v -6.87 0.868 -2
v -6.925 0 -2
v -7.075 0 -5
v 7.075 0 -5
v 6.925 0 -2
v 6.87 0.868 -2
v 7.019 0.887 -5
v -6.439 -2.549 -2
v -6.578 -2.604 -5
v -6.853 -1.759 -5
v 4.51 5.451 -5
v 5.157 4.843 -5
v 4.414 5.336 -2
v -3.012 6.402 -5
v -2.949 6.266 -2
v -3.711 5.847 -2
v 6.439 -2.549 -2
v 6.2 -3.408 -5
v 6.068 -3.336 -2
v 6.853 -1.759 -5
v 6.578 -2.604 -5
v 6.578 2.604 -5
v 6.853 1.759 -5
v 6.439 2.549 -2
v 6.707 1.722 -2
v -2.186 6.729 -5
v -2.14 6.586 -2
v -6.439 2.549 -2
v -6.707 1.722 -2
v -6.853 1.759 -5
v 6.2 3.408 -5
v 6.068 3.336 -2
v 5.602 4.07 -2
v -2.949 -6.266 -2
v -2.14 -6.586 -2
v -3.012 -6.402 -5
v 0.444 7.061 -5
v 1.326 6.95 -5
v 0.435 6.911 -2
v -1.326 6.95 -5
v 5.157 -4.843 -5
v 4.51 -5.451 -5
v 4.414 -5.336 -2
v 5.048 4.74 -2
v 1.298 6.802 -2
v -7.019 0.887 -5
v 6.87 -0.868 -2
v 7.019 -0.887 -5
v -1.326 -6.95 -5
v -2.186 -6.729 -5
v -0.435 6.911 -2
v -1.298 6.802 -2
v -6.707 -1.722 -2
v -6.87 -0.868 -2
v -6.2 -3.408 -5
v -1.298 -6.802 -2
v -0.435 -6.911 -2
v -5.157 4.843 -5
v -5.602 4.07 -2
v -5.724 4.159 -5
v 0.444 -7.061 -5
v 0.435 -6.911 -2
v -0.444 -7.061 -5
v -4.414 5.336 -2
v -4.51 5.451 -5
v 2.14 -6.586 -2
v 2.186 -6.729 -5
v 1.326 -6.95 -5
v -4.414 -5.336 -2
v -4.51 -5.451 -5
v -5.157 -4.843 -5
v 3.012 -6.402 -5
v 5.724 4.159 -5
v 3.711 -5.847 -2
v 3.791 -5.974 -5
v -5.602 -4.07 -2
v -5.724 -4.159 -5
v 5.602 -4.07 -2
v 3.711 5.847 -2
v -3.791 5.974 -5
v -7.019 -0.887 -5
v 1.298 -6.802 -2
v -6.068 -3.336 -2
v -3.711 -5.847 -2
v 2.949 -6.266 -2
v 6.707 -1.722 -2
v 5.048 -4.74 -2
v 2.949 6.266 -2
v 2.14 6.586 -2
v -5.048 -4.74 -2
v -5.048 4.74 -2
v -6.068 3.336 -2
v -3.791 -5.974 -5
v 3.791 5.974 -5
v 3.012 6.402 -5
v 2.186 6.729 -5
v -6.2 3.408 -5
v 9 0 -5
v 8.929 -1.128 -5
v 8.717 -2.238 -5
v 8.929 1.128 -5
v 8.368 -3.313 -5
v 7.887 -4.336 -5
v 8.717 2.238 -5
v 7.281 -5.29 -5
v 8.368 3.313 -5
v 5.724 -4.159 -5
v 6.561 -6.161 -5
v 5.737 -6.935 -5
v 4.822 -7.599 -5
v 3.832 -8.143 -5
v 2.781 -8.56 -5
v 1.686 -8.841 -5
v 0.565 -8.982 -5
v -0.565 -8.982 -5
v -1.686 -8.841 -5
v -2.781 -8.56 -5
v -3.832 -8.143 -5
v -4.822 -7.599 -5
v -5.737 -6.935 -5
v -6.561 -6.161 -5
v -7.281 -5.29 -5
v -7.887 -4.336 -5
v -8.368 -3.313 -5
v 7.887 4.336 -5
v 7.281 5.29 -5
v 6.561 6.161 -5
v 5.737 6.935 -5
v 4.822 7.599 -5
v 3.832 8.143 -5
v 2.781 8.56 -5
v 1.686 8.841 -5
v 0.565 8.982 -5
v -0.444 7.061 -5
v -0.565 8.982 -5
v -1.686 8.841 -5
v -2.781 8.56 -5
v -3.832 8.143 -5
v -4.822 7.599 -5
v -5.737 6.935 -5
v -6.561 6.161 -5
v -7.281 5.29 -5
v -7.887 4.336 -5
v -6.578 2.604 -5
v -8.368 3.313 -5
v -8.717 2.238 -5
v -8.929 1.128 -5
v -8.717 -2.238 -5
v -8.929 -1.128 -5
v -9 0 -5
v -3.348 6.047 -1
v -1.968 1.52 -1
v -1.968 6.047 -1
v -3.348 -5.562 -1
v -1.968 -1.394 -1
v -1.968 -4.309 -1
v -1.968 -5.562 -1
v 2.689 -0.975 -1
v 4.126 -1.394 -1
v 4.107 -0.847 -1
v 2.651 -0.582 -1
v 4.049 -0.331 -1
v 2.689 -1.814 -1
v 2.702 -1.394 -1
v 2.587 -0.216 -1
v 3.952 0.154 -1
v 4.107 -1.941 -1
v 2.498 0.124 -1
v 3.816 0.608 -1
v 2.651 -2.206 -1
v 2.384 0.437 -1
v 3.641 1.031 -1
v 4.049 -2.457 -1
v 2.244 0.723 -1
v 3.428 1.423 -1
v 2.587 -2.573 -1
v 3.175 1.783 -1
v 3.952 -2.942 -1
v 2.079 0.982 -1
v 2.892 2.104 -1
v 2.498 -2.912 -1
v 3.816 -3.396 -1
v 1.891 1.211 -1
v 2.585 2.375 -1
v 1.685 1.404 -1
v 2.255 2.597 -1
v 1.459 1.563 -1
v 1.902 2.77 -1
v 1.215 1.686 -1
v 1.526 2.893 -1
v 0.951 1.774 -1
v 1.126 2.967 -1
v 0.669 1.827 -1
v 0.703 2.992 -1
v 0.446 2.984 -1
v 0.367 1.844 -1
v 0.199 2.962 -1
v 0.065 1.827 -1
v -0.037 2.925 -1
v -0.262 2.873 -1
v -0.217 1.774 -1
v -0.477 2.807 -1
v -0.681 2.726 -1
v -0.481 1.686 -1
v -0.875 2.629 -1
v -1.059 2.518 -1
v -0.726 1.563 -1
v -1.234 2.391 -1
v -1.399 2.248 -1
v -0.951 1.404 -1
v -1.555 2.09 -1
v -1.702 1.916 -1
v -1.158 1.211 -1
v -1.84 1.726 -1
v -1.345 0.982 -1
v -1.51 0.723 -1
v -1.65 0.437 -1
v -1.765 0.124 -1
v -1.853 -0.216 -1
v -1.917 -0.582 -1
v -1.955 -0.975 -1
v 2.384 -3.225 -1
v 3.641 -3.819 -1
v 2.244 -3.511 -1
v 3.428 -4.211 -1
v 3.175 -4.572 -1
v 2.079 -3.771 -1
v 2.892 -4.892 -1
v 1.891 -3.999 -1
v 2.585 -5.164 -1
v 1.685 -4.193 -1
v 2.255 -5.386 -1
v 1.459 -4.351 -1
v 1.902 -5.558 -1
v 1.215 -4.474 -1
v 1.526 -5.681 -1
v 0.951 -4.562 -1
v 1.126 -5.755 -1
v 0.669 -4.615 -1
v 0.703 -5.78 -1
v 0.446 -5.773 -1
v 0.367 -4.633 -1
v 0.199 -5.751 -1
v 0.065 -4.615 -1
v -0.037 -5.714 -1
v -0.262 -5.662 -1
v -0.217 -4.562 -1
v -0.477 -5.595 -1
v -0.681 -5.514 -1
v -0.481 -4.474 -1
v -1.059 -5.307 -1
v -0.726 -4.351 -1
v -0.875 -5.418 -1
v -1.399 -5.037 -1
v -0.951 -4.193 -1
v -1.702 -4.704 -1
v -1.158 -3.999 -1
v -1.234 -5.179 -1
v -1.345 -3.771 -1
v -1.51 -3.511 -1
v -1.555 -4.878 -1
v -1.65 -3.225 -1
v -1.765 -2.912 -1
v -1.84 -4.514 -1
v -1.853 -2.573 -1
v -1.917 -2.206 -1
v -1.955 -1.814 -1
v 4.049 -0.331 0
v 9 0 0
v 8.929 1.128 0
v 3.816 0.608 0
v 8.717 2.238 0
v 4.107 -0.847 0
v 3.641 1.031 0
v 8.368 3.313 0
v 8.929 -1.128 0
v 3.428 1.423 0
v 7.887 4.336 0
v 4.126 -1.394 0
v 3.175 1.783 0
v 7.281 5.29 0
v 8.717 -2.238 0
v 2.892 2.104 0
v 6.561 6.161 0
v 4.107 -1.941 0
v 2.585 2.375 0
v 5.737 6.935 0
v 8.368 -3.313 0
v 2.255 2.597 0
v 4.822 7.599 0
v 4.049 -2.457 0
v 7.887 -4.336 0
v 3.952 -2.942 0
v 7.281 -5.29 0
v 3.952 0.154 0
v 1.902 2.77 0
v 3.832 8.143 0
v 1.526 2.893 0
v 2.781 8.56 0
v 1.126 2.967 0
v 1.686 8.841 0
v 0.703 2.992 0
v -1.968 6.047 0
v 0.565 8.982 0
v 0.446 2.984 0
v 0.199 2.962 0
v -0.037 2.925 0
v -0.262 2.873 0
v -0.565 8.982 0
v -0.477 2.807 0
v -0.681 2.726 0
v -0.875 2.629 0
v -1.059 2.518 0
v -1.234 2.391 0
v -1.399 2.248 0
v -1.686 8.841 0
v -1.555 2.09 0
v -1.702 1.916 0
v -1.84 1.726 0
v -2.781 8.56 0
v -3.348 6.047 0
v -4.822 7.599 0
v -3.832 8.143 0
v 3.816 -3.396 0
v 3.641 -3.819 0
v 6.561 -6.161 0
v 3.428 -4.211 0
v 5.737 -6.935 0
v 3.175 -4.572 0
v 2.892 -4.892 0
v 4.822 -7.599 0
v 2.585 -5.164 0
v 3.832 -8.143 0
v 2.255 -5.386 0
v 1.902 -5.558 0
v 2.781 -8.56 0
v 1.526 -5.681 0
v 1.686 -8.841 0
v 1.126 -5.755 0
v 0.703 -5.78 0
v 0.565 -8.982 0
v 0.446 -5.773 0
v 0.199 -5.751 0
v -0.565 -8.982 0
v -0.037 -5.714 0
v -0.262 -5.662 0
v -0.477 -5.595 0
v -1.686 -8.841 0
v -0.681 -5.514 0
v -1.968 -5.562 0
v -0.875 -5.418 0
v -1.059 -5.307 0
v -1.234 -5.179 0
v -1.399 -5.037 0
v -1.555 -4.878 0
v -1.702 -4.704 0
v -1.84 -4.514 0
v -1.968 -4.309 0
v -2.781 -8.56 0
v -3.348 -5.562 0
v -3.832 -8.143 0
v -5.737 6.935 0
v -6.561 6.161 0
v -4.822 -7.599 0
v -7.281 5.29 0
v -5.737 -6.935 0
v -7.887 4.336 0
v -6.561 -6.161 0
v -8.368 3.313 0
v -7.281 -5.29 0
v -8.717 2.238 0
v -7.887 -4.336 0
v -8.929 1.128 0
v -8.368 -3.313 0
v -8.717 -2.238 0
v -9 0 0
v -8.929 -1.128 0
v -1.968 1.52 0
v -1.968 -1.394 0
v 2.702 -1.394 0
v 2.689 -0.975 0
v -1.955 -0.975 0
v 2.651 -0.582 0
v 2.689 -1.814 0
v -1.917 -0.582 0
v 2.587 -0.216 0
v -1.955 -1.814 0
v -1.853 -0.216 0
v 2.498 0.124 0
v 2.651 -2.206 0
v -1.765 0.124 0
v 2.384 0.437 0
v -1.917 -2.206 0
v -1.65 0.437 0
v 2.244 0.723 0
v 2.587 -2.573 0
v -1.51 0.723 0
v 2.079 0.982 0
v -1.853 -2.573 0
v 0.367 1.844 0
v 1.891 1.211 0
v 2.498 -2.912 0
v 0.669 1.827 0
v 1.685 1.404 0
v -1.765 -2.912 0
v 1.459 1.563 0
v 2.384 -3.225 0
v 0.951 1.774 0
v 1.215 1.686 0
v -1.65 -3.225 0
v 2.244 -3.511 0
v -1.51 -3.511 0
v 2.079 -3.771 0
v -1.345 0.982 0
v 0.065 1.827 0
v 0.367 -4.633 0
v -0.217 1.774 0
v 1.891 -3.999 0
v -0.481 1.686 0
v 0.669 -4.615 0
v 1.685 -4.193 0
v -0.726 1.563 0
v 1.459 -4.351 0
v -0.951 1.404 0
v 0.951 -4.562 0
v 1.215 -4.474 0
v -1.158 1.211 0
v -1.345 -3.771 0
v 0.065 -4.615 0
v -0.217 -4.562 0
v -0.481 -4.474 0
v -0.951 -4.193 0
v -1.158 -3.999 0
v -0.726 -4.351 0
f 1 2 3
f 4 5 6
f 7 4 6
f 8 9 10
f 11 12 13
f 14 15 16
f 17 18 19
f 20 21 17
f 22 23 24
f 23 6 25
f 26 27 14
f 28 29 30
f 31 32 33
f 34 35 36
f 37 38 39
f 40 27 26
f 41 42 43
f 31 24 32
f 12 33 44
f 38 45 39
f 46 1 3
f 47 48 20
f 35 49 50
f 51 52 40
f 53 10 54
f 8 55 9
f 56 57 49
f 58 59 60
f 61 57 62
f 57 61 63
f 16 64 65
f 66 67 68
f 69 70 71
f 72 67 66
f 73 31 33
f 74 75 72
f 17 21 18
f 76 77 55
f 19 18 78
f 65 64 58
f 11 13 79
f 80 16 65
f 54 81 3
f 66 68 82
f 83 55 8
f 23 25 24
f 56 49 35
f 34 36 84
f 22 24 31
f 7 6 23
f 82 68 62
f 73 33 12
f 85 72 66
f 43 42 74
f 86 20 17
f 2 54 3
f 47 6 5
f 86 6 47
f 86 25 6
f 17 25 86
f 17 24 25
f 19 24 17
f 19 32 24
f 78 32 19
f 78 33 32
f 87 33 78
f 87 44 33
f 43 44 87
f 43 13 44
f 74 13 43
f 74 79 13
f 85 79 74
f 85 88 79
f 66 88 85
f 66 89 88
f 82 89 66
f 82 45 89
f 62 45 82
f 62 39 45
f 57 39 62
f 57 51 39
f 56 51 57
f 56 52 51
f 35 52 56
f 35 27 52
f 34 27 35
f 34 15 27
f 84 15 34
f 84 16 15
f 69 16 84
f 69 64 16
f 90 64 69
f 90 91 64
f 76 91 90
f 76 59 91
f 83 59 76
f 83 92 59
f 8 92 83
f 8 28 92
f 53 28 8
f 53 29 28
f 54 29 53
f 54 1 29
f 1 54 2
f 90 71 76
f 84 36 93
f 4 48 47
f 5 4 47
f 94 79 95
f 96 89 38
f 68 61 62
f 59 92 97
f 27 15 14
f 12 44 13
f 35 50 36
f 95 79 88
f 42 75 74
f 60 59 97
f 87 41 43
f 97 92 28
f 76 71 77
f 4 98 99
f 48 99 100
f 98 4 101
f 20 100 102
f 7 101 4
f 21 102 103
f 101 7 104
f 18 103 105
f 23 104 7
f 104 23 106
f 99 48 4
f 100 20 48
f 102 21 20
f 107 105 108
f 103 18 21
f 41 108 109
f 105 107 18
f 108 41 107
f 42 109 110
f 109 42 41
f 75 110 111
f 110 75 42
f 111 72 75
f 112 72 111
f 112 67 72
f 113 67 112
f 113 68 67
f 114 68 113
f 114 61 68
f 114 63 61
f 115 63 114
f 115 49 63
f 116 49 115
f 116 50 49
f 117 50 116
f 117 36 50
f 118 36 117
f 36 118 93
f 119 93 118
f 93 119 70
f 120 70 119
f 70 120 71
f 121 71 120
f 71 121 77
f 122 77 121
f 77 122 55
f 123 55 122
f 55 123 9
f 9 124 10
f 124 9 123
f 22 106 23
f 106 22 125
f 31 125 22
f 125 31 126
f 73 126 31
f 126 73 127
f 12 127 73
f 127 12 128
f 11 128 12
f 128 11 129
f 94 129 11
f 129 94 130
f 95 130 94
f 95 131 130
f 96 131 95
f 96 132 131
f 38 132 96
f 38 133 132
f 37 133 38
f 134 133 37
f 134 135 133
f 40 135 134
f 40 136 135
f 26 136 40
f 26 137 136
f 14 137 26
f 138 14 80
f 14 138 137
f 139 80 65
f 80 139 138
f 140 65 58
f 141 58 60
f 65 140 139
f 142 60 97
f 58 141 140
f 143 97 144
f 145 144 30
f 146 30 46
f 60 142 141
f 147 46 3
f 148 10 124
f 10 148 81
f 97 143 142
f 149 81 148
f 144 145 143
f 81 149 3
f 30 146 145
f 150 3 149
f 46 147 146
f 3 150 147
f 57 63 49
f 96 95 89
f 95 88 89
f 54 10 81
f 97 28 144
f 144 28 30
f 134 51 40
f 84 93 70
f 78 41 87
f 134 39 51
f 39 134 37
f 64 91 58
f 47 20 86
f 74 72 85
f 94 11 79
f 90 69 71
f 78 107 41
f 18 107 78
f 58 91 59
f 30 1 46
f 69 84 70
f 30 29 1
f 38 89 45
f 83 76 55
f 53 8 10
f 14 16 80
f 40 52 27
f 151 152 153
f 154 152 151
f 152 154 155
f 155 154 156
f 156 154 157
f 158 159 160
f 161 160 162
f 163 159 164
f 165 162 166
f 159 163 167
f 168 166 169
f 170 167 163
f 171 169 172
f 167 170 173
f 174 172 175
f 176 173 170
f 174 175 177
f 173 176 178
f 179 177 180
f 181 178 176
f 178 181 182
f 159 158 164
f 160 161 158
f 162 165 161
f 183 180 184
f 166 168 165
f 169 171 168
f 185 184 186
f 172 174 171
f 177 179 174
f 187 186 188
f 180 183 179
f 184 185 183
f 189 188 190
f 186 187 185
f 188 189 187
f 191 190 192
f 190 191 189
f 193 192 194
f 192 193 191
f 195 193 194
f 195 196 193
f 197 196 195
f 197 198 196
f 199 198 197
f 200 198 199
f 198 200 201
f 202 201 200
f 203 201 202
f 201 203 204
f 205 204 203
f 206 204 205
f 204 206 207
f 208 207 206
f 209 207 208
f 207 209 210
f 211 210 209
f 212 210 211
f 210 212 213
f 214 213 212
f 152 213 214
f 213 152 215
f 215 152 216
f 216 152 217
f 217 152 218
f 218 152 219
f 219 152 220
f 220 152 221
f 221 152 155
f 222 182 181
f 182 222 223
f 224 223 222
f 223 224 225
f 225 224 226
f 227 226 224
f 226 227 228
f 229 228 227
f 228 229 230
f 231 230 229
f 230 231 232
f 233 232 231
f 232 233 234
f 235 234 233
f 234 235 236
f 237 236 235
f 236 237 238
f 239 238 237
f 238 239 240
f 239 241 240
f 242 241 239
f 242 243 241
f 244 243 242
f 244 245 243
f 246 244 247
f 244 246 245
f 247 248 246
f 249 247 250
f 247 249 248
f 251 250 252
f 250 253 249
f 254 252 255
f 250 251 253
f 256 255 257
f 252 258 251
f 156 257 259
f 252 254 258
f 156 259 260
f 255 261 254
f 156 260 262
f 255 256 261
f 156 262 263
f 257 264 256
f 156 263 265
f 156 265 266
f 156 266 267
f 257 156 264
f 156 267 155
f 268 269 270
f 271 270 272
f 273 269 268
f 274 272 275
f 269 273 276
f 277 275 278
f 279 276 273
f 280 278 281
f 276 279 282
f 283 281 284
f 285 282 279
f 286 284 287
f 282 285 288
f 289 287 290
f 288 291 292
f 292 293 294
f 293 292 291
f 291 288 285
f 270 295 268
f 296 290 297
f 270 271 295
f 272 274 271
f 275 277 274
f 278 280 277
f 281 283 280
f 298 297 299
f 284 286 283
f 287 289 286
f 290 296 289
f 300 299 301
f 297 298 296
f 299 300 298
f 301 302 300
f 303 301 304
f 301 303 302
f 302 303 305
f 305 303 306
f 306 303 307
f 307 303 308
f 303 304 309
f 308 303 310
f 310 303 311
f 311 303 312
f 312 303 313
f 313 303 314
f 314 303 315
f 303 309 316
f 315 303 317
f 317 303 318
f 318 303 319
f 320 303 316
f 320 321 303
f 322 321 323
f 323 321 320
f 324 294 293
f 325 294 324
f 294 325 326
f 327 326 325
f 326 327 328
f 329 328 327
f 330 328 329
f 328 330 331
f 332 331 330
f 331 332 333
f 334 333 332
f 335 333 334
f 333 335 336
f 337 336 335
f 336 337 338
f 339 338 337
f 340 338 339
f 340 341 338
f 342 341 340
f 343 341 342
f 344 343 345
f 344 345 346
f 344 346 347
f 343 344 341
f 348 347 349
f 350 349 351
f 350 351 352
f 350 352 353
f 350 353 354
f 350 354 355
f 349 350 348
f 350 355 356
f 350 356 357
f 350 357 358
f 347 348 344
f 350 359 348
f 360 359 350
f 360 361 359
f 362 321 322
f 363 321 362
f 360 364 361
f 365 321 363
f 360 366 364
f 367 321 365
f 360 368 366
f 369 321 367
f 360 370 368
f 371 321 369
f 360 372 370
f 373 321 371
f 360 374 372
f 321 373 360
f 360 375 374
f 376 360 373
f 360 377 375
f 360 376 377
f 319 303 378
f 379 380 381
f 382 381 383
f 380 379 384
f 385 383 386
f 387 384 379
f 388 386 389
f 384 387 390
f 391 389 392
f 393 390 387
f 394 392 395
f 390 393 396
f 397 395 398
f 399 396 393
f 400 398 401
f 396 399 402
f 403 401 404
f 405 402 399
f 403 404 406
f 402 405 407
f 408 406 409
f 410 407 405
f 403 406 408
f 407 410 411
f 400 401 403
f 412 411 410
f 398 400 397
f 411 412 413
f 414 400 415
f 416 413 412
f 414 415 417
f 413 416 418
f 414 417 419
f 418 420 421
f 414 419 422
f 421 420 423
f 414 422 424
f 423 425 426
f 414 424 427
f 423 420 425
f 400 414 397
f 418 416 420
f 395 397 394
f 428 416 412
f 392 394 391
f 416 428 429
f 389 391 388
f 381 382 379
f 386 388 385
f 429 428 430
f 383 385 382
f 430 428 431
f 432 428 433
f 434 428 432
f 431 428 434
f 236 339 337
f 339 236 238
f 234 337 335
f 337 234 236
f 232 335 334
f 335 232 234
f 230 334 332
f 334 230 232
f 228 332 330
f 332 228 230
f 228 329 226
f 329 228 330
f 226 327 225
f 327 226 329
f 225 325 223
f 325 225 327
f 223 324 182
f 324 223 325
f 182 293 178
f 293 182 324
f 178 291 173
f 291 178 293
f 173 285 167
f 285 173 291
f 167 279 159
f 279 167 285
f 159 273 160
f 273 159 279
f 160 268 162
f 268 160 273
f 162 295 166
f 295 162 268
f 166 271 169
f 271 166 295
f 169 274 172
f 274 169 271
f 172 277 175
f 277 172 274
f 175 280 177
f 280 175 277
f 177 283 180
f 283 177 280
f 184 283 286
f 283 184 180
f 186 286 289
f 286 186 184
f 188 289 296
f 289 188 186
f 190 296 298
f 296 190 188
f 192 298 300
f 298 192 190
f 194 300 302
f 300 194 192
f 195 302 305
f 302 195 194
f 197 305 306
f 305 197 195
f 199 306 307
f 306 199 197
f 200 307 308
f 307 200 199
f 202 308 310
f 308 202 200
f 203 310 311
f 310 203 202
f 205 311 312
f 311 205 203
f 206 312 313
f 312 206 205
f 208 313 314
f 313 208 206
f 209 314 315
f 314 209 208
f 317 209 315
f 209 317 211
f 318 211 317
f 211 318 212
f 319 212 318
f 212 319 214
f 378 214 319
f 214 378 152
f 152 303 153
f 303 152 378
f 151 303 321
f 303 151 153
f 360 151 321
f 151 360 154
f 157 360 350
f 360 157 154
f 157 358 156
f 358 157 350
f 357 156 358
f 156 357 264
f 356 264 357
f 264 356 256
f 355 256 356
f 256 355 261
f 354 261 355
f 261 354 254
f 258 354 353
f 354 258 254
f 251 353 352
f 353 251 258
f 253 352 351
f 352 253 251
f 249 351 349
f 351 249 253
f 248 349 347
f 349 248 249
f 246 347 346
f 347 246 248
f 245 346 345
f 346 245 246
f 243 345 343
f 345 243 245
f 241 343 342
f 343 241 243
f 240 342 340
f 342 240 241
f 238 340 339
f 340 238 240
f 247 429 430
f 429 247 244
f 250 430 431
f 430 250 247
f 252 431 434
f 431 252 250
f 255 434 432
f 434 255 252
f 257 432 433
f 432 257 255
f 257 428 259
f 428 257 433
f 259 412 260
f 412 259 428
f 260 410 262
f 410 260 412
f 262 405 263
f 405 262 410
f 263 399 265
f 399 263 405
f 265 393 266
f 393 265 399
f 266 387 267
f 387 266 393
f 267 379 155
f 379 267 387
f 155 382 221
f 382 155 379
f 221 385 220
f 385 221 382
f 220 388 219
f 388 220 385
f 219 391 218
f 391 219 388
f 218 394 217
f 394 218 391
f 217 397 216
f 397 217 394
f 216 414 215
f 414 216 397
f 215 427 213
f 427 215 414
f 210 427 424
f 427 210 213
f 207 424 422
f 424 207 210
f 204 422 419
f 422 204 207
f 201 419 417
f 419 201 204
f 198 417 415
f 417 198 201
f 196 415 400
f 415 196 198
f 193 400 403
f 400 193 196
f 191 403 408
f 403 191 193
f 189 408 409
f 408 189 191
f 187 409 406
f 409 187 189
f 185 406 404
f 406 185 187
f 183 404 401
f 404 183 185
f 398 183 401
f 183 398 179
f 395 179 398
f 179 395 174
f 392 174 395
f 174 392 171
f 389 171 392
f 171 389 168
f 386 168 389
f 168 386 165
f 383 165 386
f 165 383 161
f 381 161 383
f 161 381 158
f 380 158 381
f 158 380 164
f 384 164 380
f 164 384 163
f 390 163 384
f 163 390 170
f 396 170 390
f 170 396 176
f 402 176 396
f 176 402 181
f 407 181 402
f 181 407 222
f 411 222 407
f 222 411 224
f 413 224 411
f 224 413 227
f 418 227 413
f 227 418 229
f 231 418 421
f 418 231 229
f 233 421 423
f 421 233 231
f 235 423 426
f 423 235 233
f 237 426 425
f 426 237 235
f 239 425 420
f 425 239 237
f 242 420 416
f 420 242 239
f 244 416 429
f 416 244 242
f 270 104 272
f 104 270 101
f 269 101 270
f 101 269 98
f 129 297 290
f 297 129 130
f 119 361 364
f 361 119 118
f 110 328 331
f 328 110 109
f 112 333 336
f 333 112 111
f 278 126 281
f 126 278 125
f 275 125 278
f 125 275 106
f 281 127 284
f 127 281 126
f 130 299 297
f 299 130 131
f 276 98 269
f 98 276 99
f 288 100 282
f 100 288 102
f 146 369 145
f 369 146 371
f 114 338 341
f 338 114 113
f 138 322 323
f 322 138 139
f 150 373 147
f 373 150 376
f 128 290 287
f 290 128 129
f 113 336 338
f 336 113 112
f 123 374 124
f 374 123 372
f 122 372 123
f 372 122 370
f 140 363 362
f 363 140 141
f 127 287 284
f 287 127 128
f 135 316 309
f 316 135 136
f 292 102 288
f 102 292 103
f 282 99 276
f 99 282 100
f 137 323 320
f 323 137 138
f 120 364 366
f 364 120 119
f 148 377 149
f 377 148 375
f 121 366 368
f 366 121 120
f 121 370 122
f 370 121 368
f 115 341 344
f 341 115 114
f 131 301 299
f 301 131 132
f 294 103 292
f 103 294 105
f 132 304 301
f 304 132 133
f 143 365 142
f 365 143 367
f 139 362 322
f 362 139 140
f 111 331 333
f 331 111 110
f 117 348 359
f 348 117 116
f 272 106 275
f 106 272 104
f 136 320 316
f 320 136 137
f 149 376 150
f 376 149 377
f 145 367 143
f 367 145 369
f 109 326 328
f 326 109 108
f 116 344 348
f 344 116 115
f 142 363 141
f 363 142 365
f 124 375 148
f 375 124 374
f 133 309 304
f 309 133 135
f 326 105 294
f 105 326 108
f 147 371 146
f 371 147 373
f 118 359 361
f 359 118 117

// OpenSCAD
$fn = 50;

difference() {
	union() {
		translate(v = [0, 0, -5.0]) {
			cylinder(h = 5, r = 9.0);
		}
	}
	union() {
		#translate(v = [0, 0, -5.0]) {
			cylinder(h = 3, r1 = 7.075, r2 = 6.925);
		}
		translate(v = [0, 0, -1]) {
			linear_extrude(height = 1) {
				text(font = "Webdings", halign = "center", size = 11, text = "b", valign = "center");
			}
		}
	}
}
